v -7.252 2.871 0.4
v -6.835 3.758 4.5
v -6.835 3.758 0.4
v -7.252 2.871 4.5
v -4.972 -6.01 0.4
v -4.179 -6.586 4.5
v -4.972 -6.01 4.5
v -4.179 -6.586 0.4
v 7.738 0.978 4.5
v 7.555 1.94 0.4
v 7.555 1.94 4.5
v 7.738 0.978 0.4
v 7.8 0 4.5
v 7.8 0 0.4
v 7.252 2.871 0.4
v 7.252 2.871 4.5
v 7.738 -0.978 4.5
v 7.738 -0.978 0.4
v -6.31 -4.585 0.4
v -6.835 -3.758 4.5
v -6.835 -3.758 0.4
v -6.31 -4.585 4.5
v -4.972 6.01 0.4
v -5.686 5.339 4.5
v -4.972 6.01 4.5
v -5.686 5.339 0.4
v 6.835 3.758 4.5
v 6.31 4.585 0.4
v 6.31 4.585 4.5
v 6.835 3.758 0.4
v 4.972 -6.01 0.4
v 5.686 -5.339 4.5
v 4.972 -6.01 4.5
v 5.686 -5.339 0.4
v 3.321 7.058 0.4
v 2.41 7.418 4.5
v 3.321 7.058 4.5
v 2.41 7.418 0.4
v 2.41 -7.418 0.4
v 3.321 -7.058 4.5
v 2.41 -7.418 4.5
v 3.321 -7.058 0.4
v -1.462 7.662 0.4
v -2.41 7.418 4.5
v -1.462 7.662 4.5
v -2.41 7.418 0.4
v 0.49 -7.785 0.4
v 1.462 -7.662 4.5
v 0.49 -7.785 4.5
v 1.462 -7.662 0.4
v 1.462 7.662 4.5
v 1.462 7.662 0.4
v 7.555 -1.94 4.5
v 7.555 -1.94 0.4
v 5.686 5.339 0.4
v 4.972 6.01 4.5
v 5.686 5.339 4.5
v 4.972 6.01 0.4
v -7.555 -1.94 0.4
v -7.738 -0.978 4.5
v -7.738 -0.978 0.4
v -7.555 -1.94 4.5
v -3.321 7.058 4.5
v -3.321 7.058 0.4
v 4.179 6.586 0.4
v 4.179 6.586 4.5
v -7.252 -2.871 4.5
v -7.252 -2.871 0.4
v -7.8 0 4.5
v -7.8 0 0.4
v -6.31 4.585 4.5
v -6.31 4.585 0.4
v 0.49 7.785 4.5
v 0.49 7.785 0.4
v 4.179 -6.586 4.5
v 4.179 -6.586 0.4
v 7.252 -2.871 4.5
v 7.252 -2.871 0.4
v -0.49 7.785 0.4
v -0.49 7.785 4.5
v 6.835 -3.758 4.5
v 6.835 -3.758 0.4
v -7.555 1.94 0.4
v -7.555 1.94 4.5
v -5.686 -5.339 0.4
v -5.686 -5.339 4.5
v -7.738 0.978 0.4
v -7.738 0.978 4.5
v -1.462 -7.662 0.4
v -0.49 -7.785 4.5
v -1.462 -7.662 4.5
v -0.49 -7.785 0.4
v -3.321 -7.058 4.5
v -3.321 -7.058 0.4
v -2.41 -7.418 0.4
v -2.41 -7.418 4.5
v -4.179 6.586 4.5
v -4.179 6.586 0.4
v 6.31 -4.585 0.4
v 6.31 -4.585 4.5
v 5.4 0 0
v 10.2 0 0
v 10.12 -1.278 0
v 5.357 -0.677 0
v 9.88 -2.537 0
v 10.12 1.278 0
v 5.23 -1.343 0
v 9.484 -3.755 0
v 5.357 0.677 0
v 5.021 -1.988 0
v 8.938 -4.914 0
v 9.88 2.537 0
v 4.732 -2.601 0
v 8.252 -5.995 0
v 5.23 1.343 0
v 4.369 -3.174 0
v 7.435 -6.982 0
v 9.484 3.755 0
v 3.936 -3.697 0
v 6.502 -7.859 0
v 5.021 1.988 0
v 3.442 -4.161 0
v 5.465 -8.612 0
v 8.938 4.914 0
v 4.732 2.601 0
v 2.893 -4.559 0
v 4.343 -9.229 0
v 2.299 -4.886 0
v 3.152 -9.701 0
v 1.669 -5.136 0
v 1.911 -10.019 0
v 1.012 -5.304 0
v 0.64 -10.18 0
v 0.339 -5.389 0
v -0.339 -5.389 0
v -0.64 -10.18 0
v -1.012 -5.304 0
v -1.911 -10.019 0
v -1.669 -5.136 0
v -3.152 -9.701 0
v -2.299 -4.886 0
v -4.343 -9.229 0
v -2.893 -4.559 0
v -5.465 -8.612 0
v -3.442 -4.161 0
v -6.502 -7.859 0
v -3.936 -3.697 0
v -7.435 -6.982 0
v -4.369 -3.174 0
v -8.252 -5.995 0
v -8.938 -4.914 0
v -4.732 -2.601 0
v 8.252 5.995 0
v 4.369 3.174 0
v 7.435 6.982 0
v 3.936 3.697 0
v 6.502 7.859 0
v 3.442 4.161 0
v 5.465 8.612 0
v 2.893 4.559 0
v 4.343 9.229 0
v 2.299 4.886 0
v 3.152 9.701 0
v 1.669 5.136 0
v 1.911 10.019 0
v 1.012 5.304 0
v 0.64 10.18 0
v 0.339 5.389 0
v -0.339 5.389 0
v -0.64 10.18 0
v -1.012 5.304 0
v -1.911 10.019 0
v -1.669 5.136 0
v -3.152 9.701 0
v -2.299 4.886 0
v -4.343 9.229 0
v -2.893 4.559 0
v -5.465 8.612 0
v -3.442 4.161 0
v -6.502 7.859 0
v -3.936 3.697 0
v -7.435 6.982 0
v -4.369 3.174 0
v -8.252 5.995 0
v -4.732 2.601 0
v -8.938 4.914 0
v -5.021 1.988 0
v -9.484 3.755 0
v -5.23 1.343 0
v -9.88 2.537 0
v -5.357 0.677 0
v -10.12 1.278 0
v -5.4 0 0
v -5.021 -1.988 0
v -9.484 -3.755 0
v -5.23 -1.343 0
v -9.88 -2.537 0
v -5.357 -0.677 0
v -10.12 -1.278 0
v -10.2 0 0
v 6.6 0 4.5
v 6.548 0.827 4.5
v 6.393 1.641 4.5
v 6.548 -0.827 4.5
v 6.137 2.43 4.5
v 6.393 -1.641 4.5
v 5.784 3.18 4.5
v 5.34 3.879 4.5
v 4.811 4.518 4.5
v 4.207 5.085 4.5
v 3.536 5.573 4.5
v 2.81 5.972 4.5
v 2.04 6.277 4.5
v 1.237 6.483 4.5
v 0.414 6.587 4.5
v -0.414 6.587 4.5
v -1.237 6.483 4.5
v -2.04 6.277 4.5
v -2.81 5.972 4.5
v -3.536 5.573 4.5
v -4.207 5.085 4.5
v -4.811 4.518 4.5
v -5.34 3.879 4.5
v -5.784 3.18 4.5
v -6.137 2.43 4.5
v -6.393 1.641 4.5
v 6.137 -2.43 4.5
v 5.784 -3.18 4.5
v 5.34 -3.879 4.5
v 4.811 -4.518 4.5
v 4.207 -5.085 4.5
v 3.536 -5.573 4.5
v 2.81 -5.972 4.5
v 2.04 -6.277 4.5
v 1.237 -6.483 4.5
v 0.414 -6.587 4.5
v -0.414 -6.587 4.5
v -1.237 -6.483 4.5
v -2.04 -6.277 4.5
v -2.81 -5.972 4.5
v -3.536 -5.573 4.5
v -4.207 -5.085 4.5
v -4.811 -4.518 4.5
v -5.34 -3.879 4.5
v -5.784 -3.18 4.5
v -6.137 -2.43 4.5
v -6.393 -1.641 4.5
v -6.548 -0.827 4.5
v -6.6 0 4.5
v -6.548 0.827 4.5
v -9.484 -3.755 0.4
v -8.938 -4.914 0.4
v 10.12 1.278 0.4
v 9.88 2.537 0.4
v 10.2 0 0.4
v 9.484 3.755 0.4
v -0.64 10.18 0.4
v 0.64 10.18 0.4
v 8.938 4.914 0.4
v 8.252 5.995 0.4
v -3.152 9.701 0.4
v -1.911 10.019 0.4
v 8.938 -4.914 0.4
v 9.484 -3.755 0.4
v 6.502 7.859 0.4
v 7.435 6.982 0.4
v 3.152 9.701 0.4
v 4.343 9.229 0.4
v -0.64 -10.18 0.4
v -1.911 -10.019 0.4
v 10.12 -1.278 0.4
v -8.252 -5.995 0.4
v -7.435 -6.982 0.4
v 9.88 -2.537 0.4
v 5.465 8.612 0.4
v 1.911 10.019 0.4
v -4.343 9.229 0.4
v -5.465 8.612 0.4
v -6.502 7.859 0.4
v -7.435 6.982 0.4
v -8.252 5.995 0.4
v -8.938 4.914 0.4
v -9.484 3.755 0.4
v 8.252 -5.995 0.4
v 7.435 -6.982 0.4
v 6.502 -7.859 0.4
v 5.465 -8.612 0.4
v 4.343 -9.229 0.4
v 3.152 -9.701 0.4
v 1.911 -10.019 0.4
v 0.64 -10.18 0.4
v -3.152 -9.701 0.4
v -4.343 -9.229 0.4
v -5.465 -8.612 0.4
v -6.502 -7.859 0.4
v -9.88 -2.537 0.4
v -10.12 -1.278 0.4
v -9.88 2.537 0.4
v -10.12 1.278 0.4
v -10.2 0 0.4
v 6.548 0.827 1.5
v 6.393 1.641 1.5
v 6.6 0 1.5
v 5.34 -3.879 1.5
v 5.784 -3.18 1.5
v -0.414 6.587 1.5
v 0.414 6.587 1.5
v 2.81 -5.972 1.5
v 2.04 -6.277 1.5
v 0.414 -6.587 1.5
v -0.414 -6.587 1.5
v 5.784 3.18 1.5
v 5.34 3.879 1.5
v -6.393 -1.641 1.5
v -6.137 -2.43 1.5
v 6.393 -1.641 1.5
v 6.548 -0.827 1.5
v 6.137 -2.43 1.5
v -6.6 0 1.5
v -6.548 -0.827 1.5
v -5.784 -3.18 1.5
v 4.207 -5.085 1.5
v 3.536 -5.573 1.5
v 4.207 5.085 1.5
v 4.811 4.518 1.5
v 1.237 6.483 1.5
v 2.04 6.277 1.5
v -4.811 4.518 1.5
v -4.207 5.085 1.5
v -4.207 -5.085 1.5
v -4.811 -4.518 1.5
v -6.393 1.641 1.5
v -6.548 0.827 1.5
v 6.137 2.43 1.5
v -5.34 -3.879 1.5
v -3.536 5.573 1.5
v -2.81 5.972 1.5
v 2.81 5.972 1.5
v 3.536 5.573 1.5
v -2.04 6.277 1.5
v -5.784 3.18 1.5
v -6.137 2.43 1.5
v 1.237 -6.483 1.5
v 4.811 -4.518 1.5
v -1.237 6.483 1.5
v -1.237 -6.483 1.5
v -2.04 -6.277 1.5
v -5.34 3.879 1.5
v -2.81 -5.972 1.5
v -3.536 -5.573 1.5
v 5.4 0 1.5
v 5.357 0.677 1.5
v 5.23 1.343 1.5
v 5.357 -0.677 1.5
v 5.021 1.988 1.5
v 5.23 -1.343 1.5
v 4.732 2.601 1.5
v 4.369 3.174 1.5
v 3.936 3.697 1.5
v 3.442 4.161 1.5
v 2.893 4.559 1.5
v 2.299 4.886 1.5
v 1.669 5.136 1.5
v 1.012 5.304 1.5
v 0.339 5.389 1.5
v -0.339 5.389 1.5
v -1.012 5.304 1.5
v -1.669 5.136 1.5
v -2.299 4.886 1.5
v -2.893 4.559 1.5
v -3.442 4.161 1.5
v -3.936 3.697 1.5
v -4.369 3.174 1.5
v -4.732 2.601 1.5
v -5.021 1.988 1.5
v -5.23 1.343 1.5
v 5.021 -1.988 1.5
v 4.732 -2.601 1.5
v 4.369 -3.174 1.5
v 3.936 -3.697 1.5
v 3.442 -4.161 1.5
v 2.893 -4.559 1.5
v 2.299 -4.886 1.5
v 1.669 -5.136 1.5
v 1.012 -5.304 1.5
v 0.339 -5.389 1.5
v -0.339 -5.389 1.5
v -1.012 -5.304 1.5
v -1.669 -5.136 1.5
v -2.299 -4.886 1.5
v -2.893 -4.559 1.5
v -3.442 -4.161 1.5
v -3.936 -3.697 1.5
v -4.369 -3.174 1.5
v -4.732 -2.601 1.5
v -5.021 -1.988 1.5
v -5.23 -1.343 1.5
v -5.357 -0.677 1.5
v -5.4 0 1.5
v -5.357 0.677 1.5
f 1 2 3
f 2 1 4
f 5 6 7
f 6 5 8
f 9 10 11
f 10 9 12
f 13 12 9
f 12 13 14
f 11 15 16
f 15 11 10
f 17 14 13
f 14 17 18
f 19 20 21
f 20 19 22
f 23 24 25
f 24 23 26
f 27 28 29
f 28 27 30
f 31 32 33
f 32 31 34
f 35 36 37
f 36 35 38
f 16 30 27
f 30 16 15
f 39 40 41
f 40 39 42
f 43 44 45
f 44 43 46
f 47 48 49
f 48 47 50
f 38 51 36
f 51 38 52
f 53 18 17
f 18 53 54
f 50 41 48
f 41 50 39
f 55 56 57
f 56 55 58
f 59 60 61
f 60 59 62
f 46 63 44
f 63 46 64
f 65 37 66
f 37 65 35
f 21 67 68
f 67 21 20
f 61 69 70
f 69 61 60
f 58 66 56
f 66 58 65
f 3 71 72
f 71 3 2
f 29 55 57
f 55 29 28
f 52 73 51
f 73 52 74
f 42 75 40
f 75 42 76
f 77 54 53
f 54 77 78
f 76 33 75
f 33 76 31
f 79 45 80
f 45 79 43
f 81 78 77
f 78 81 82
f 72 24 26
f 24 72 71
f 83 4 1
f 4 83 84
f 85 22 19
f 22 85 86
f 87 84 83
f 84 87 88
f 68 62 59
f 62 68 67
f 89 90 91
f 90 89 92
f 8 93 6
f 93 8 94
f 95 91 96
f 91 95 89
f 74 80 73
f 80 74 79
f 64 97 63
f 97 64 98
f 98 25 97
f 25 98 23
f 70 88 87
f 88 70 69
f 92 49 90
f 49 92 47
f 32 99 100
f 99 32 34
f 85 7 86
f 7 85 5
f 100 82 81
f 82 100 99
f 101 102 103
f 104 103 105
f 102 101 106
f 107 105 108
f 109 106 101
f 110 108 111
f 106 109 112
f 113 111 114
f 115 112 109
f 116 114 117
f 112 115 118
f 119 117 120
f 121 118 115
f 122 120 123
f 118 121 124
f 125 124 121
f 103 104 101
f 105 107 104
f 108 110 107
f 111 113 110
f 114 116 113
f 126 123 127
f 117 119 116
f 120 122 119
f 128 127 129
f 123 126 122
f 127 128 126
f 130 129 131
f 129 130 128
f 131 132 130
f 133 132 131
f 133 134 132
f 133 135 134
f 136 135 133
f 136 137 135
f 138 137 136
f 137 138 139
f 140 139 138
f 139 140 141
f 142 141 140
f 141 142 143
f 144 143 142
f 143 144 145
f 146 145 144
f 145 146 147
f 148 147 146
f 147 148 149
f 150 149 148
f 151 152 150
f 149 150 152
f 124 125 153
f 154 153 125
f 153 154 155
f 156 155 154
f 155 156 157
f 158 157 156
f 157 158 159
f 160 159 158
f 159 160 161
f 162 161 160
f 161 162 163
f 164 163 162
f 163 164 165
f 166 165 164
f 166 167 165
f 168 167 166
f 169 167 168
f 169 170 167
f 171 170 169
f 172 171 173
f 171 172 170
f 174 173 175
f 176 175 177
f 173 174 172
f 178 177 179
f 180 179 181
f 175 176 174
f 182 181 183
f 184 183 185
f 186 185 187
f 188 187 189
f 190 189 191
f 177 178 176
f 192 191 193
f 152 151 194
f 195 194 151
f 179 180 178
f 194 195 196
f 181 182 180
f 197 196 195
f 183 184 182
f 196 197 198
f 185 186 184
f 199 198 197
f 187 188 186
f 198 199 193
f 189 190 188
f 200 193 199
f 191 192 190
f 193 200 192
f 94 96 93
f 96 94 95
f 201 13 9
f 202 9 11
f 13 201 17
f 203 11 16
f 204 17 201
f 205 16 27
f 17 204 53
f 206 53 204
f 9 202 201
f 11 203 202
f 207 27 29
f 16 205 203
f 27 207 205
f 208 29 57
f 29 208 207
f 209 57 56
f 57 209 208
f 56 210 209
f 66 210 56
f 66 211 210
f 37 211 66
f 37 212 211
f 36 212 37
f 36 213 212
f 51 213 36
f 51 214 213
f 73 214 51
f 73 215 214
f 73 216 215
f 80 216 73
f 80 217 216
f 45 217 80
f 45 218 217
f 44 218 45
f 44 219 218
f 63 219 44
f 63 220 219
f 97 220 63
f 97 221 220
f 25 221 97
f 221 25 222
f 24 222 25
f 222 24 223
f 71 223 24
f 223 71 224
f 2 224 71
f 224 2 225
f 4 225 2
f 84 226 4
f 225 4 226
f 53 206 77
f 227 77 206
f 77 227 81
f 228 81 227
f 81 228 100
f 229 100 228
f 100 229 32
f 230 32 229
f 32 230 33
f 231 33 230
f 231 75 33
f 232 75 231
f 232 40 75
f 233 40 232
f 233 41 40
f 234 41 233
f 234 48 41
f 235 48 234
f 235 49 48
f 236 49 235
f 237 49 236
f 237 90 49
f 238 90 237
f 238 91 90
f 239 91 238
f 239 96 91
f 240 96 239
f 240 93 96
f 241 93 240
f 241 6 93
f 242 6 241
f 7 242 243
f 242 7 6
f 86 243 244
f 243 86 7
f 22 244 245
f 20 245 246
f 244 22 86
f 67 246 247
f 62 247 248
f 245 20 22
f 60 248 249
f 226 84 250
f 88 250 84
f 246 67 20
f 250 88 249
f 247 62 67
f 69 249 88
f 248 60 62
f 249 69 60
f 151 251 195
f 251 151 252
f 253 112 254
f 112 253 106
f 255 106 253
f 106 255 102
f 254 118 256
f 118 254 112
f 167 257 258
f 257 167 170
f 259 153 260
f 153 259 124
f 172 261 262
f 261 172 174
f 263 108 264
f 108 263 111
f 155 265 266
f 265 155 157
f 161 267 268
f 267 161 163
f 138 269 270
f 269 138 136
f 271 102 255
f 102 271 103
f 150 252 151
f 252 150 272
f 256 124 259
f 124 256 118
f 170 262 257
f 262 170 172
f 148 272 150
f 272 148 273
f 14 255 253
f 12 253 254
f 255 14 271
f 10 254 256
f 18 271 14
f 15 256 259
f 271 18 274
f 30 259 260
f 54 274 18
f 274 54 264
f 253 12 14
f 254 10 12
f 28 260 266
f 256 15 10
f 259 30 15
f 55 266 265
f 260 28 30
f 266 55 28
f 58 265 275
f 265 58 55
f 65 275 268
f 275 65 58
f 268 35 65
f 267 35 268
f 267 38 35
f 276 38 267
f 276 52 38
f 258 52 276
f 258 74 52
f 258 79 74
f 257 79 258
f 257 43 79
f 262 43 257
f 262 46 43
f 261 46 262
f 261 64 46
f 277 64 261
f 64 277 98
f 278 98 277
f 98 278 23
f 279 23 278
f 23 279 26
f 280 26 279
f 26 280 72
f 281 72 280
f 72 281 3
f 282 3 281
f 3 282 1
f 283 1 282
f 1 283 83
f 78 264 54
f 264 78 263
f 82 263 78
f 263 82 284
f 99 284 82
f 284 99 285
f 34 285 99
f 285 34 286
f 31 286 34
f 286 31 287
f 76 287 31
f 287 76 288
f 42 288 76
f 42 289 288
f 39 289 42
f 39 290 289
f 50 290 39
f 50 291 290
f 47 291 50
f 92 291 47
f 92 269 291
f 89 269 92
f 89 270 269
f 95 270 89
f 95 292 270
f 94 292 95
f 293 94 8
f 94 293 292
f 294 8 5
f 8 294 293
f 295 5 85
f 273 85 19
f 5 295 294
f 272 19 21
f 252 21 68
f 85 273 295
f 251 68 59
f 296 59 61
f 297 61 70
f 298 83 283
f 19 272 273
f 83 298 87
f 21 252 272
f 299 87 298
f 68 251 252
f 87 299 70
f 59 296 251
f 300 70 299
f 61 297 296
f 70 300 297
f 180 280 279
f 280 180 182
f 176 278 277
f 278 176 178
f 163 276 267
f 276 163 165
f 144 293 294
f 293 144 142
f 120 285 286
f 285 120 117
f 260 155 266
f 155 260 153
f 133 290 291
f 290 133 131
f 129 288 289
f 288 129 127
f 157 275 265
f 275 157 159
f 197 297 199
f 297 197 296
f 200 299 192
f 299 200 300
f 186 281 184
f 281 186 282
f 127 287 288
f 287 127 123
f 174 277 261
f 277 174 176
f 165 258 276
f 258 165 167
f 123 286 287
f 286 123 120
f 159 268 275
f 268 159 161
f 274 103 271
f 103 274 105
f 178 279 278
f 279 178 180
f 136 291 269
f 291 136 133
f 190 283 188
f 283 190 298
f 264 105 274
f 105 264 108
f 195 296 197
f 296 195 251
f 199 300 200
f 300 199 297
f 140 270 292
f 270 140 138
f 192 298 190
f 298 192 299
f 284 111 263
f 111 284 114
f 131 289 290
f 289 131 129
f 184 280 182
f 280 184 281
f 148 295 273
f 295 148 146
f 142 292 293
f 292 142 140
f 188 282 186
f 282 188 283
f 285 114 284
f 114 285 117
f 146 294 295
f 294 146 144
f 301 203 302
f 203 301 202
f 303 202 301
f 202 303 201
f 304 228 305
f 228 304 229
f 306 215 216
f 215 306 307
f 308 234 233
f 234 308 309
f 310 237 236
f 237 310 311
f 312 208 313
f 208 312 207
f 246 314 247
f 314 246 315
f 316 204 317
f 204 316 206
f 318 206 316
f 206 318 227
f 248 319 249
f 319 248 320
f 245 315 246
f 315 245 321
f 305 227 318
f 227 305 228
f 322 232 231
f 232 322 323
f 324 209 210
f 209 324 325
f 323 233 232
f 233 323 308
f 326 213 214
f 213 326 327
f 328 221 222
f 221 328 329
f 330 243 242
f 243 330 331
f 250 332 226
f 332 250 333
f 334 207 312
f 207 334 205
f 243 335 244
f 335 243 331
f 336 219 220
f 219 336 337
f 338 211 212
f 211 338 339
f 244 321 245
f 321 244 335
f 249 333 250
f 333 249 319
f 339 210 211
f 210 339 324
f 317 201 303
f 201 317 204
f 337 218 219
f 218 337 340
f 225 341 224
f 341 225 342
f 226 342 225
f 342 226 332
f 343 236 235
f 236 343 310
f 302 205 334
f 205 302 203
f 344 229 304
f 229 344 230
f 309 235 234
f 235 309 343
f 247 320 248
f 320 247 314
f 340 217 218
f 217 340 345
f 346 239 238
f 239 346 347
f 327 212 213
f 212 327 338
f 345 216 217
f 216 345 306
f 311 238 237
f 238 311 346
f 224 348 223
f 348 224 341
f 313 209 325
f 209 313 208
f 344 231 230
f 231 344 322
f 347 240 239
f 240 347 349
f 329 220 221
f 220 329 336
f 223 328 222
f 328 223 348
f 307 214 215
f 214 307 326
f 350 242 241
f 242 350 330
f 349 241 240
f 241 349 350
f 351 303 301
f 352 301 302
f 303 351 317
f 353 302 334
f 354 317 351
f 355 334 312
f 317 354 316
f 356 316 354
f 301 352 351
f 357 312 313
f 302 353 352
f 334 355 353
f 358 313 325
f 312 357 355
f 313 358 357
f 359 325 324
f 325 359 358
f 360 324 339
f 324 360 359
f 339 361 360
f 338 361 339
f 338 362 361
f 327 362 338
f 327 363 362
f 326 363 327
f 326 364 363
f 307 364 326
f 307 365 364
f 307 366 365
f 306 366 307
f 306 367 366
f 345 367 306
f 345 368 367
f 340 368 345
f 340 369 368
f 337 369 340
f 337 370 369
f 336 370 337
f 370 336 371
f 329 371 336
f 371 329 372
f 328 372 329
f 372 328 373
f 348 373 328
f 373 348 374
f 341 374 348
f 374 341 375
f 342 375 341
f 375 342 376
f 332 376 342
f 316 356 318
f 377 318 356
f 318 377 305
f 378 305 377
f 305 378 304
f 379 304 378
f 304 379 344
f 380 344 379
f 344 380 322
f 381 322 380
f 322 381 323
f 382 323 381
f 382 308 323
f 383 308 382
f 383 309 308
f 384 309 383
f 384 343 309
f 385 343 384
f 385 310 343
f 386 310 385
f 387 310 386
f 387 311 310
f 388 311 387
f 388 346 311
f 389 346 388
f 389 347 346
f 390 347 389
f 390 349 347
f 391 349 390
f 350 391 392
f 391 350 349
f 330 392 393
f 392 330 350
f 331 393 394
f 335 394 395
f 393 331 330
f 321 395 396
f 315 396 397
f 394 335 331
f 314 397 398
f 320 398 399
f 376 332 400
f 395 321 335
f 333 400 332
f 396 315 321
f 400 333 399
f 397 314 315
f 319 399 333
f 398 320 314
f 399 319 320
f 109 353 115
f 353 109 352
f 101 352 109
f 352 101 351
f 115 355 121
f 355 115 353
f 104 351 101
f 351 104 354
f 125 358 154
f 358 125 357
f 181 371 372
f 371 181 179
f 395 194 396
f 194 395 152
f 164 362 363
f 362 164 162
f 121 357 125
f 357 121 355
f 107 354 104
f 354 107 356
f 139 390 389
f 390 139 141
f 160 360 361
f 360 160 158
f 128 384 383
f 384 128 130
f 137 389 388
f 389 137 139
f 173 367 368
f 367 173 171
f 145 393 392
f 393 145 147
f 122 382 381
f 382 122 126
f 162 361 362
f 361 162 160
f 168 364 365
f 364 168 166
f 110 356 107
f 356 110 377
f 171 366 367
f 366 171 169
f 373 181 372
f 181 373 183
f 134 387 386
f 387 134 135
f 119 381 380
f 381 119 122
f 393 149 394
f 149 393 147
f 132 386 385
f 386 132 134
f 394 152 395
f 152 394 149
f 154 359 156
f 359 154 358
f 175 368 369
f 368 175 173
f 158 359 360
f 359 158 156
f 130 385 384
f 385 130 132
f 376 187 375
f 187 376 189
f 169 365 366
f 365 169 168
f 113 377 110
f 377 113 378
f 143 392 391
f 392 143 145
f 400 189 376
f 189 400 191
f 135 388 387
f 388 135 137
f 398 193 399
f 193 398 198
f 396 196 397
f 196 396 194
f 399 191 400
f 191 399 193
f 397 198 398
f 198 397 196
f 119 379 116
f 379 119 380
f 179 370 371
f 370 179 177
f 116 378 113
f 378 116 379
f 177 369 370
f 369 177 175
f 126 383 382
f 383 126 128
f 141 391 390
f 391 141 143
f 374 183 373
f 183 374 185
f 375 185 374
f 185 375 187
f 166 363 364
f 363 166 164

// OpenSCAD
// PRUSA iteration3
// 624 bearing belt guide
// GNU GPL v3
// Josef Průša <iam@josefprusa.cz> and contributors
// http://www.reprap.org/wiki/Prusa_Mendel
// http://prusamendel.org

wall= 1.2;
clearence= 0.1; 

module belt_guide_base(){
 cylinder(r=6.5+wall+clearence, h=4.5, $fn=50);
 cylinder(r=6.5+wall+clearence+2*wall, h=0.4, $fn=50);
}

module belt_guide_holes(){
 translate([0,0,1.5]) cylinder(r=6.5+clearence, h=10, $fn=50);
 translate([0,0,-1]) cylinder(r=6.5+wall+clearence-2*wall, h=10, $fn=50);
}

// Final part
module belt_guide(){
 difference(){
  belt_guide_base();
  belt_guide_holes();
 }
}

belt_guide();
